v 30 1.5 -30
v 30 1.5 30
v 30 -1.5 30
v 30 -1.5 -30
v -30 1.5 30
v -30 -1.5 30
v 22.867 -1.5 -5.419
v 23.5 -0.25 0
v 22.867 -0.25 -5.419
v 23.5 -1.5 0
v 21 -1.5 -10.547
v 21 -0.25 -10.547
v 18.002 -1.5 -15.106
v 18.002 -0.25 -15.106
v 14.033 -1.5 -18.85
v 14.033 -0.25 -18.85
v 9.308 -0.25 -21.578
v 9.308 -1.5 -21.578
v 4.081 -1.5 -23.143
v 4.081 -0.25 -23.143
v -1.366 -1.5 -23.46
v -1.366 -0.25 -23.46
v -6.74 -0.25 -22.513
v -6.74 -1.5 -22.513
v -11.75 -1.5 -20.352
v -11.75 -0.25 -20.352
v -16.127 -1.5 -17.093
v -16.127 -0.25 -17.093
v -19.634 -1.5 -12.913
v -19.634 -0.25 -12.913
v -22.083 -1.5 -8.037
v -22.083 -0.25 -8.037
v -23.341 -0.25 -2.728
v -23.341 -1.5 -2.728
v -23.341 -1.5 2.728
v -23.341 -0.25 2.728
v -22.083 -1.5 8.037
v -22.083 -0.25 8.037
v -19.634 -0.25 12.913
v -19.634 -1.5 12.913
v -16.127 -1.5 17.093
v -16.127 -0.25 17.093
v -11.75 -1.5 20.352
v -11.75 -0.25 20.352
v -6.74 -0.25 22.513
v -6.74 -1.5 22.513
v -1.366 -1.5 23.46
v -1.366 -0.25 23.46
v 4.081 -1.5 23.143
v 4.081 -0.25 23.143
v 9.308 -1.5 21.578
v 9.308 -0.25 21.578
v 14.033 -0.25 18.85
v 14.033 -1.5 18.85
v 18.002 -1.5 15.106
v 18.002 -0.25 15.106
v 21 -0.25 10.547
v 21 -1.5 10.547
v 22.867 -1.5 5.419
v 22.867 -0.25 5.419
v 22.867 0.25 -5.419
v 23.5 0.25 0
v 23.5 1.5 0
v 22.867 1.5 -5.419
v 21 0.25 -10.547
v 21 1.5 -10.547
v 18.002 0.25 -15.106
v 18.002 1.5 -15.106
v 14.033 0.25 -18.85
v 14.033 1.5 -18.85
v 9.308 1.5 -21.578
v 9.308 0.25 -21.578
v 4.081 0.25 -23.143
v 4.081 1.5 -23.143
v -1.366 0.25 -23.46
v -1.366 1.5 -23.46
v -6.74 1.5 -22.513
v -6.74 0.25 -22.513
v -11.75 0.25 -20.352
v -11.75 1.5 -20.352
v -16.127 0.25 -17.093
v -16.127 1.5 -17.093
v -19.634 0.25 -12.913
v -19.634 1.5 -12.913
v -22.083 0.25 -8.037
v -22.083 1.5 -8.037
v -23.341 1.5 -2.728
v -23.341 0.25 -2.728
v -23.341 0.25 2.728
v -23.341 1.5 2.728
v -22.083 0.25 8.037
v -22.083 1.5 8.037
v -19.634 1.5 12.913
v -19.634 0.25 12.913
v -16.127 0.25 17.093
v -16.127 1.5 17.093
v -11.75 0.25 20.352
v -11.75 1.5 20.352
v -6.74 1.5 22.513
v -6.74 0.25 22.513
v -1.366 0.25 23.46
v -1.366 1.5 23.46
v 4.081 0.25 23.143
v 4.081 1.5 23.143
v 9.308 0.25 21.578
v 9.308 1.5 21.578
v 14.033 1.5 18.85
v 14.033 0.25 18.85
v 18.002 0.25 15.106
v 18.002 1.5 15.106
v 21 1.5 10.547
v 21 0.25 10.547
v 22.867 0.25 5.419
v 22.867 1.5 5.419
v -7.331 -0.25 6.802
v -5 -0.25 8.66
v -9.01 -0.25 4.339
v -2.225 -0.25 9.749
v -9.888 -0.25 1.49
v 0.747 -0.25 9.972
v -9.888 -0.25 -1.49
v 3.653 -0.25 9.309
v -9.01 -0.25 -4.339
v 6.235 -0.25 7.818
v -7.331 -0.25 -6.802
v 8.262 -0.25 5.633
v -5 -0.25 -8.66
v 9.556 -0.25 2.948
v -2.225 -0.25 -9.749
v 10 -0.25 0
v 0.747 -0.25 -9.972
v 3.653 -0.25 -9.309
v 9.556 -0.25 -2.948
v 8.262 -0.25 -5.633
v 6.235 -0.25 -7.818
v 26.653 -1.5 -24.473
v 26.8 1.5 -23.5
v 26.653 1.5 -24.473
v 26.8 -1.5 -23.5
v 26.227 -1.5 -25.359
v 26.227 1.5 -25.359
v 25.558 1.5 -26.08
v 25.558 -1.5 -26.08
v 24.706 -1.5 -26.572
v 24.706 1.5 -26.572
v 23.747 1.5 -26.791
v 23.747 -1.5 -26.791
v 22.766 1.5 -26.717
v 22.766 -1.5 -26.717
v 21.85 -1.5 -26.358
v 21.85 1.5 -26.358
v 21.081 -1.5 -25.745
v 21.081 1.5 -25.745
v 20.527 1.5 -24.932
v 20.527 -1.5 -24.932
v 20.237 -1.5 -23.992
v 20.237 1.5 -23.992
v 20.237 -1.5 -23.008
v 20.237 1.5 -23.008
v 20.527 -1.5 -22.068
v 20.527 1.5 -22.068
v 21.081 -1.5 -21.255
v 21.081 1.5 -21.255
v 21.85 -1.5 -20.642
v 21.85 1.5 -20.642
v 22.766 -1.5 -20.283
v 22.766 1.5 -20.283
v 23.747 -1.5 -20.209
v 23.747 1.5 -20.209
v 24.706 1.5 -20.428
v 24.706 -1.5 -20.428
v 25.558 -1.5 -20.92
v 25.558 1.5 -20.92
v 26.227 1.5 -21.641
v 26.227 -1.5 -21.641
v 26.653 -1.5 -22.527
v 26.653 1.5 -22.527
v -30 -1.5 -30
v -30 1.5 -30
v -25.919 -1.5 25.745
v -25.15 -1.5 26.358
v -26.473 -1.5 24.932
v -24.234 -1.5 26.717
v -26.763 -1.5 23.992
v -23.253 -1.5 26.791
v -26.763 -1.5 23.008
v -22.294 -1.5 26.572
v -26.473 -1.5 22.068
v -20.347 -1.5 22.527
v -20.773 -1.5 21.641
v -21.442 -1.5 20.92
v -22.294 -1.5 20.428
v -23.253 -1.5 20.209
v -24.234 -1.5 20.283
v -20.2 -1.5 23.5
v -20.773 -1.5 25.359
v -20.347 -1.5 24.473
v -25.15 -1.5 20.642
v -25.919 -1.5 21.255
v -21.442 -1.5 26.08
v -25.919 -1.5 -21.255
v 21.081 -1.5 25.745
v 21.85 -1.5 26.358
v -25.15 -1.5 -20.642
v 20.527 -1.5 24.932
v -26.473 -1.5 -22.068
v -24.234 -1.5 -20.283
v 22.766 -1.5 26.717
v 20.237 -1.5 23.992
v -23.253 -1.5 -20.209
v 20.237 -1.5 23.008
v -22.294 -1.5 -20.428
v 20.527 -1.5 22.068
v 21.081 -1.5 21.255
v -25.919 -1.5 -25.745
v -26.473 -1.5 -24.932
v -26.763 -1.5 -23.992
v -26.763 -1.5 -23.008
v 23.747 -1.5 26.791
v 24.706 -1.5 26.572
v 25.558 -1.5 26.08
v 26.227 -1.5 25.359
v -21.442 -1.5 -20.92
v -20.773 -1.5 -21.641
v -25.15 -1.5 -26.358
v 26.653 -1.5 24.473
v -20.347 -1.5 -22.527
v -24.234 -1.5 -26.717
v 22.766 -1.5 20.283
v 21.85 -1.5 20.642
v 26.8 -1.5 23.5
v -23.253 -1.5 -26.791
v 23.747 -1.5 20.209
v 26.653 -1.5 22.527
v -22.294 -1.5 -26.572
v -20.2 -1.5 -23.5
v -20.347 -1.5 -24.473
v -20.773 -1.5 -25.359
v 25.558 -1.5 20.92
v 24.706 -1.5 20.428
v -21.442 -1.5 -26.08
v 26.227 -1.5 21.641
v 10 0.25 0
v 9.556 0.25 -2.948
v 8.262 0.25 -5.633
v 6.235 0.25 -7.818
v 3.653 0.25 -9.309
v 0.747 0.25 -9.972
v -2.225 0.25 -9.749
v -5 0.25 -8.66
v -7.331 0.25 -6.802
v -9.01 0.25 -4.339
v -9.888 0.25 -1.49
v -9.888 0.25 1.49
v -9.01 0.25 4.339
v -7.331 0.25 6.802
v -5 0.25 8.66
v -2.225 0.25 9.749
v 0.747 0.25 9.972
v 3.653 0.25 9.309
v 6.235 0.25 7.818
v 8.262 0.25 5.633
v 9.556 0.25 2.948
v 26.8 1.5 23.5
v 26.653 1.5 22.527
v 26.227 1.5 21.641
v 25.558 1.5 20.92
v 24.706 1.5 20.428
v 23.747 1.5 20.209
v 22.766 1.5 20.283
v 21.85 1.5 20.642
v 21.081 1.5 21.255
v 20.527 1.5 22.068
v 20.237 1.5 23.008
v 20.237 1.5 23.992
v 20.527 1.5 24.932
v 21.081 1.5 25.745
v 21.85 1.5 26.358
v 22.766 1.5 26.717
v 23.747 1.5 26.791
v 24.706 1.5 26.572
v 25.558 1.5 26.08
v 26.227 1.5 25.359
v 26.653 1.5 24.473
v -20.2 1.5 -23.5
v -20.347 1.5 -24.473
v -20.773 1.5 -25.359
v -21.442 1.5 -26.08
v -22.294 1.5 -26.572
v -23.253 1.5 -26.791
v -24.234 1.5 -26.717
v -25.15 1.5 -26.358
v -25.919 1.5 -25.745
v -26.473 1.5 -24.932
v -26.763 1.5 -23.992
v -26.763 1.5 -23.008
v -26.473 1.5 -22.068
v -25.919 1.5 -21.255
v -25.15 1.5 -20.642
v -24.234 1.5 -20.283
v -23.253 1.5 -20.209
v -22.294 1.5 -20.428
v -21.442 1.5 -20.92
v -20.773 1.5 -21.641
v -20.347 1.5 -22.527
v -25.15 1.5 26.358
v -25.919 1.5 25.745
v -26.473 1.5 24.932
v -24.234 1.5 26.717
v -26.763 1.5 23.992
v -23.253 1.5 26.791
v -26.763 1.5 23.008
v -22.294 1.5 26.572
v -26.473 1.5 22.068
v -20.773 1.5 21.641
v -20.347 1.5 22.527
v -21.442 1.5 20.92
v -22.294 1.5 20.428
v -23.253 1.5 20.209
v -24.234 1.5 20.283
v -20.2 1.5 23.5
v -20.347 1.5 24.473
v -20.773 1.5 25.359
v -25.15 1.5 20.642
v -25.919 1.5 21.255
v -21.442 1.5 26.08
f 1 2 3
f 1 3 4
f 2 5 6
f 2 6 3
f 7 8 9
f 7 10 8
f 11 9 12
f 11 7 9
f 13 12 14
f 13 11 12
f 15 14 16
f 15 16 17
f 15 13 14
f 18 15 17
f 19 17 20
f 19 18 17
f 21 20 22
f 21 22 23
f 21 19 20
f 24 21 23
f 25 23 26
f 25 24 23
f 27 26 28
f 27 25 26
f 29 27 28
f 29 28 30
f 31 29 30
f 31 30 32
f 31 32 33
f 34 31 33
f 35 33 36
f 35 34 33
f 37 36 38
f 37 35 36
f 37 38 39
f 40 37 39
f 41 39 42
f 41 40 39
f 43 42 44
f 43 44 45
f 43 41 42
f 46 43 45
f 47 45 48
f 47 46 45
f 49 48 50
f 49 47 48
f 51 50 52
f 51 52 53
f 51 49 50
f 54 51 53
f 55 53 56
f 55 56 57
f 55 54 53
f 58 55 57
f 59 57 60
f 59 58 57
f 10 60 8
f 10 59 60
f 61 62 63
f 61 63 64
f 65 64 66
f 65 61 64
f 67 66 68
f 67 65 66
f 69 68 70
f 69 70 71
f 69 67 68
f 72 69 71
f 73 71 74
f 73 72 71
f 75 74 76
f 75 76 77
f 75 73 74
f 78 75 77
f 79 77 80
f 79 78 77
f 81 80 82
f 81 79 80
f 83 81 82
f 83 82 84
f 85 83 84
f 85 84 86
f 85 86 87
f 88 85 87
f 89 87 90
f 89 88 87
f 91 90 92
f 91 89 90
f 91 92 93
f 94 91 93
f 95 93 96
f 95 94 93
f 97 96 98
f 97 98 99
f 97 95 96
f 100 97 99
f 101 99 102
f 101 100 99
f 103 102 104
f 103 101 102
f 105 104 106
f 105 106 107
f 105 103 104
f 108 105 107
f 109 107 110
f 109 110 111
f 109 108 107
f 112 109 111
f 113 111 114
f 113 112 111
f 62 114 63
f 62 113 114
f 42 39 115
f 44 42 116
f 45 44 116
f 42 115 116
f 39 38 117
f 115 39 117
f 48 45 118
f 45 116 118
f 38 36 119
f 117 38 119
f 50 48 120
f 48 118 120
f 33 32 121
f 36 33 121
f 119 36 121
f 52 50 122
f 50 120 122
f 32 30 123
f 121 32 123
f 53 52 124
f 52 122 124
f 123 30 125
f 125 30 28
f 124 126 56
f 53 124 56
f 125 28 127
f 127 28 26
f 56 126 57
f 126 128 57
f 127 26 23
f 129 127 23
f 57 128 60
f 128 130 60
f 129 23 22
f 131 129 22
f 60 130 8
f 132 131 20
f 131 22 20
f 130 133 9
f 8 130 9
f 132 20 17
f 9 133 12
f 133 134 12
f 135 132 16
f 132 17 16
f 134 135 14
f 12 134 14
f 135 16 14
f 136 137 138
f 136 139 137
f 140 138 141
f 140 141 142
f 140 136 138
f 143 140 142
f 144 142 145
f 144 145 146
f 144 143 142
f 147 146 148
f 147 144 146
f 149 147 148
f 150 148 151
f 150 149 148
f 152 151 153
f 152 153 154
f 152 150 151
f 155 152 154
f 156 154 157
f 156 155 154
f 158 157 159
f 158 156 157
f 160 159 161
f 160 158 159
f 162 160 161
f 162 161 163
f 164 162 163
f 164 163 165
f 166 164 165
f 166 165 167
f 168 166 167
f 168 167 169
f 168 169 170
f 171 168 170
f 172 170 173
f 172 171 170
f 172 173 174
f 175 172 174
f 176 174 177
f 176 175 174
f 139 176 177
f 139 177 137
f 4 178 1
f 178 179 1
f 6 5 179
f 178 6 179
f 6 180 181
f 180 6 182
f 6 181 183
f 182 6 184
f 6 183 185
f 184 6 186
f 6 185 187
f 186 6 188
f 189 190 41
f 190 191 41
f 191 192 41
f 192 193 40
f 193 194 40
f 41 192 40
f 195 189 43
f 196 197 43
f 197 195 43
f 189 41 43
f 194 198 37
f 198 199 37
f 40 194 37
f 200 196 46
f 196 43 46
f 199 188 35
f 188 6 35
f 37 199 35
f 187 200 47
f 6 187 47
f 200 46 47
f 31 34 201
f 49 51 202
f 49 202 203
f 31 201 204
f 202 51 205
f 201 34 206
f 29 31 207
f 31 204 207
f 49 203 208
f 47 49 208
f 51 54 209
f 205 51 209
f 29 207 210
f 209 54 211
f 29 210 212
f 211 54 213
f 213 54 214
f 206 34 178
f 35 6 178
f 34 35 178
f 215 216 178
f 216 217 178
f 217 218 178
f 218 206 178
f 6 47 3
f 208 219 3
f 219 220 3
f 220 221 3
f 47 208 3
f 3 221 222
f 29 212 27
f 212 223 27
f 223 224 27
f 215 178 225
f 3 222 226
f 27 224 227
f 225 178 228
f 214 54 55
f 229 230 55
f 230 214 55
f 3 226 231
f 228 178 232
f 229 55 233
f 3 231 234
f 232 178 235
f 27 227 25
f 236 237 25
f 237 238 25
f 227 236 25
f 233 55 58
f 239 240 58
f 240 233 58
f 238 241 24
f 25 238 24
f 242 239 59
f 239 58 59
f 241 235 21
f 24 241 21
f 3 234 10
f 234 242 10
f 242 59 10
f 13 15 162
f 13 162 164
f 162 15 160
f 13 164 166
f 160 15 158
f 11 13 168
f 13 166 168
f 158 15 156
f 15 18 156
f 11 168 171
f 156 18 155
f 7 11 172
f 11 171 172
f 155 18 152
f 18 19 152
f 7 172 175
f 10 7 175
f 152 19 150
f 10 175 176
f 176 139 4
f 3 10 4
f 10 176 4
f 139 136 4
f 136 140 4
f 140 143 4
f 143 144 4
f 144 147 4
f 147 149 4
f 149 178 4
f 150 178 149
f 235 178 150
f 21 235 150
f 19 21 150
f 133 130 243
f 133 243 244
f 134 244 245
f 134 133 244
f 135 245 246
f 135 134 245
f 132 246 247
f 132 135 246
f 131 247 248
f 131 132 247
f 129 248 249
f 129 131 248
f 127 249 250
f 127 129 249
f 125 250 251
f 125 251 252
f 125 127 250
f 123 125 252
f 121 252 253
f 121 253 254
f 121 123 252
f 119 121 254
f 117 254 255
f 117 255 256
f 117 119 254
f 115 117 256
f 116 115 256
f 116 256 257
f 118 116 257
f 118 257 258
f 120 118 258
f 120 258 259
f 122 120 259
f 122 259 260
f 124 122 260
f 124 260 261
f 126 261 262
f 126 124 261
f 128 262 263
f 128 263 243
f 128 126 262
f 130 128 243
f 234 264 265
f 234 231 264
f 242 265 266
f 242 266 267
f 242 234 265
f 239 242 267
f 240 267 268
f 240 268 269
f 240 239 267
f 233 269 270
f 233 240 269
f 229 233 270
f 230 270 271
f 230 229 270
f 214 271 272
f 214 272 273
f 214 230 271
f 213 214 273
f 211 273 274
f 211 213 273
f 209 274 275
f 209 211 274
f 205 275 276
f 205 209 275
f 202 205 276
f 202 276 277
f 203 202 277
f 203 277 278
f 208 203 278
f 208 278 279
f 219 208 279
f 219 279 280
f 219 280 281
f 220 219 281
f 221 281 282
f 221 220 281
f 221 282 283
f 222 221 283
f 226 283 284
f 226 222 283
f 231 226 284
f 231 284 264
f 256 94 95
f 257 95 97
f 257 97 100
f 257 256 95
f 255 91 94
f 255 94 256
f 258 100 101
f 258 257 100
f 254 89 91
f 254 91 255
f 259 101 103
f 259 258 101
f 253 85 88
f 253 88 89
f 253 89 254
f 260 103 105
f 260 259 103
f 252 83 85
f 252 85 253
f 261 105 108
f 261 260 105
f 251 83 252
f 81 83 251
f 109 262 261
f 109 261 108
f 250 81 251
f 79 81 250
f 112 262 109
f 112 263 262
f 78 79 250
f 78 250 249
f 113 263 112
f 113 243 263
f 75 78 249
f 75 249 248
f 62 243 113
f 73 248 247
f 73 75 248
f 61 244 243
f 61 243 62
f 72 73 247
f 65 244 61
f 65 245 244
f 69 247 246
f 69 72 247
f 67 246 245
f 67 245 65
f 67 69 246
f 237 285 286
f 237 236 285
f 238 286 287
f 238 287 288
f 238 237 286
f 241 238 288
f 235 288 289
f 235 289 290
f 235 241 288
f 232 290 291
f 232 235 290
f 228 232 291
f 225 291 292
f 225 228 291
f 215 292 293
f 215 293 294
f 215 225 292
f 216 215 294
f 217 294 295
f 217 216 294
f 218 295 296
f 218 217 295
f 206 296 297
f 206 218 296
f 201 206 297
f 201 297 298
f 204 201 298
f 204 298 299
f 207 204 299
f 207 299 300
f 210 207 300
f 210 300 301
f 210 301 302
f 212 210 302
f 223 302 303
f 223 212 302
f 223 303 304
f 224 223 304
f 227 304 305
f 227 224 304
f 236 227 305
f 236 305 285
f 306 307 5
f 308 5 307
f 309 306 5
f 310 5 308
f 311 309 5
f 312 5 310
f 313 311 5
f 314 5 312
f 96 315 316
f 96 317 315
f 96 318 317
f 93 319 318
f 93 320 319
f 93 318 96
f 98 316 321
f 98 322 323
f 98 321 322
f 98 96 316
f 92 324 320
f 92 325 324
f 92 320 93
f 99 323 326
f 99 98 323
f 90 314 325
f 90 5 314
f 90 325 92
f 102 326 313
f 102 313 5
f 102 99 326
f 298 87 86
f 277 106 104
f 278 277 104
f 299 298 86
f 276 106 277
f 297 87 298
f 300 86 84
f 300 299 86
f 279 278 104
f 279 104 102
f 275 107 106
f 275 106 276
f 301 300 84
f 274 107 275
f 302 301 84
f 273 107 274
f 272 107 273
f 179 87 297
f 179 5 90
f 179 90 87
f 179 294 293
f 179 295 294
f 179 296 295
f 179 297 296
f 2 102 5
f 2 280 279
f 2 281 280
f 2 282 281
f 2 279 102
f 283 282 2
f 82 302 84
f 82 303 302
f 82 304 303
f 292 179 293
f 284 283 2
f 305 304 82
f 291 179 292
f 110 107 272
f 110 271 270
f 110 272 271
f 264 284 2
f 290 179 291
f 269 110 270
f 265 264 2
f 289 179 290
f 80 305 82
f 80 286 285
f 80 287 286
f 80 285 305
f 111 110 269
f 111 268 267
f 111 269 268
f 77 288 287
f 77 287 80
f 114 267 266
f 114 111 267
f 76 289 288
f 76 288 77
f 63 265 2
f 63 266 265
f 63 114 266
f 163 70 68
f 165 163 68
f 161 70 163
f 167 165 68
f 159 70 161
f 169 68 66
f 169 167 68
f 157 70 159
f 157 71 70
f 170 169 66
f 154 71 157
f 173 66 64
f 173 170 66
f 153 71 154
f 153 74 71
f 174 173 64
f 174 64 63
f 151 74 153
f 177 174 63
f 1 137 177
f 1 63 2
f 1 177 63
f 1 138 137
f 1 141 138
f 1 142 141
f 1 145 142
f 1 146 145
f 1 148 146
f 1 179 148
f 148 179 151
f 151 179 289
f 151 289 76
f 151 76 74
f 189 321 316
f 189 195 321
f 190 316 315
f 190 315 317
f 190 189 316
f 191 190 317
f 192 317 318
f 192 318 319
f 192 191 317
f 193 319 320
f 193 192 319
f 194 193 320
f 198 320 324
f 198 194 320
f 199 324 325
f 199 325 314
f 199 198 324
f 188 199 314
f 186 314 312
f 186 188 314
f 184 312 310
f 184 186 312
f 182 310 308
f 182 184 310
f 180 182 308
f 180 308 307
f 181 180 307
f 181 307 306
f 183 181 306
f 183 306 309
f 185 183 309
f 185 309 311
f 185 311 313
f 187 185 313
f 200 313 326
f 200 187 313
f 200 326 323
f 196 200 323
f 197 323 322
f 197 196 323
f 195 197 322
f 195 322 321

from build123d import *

# Parameters (mm, degrees)
SKETCH2_W           = 60
SKETCH2_H           = 60
SKETCH2_R           = 23.5
SKETCH2_R_2         = 3.3
BOSS_EXTRUDE1_DEPTH = 1.5
BOSS_EXTRUDE2_START = -0.25
SKETCH2_3_R         = 23.5
SKETCH2_3_R_2       = 10
BOSS_EXTRUDE2_DEPTH = 0.5


with BuildPart() as part:
    # Sketch2 → Boss-Extrude1 (new body, symmetric)
    with BuildSketch(Plane(origin=(0, 0, 0), x_dir=(1, 0, 0), z_dir=(0, 1, 0))):
        Rectangle(SKETCH2_W, SKETCH2_H)
        Circle(SKETCH2_R, mode=Mode.SUBTRACT)
        with Locations((23.5, 23.5)):
            Circle(SKETCH2_R_2, mode=Mode.SUBTRACT)
        with Locations((-23.5, 23.5)):
            Circle(SKETCH2_R_2, mode=Mode.SUBTRACT)
        with Locations((23.5, -23.5)):
            Circle(SKETCH2_R_2, mode=Mode.SUBTRACT)
        with Locations((-23.5, -23.5)):
            Circle(SKETCH2_R_2, mode=Mode.SUBTRACT)
    extrude(amount=BOSS_EXTRUDE1_DEPTH, both=True)

    # Sketch2_3 → Boss-Extrude2 (add)
    with BuildSketch(Plane(origin=(0, 0, 0), x_dir=(1, 0, 0), z_dir=(0, 1, 0)).offset(BOSS_EXTRUDE2_START)):
        Circle(SKETCH2_3_R)
        Circle(SKETCH2_3_R_2, mode=Mode.SUBTRACT)
    extrude(amount=BOSS_EXTRUDE2_DEPTH)


solid = part.part
